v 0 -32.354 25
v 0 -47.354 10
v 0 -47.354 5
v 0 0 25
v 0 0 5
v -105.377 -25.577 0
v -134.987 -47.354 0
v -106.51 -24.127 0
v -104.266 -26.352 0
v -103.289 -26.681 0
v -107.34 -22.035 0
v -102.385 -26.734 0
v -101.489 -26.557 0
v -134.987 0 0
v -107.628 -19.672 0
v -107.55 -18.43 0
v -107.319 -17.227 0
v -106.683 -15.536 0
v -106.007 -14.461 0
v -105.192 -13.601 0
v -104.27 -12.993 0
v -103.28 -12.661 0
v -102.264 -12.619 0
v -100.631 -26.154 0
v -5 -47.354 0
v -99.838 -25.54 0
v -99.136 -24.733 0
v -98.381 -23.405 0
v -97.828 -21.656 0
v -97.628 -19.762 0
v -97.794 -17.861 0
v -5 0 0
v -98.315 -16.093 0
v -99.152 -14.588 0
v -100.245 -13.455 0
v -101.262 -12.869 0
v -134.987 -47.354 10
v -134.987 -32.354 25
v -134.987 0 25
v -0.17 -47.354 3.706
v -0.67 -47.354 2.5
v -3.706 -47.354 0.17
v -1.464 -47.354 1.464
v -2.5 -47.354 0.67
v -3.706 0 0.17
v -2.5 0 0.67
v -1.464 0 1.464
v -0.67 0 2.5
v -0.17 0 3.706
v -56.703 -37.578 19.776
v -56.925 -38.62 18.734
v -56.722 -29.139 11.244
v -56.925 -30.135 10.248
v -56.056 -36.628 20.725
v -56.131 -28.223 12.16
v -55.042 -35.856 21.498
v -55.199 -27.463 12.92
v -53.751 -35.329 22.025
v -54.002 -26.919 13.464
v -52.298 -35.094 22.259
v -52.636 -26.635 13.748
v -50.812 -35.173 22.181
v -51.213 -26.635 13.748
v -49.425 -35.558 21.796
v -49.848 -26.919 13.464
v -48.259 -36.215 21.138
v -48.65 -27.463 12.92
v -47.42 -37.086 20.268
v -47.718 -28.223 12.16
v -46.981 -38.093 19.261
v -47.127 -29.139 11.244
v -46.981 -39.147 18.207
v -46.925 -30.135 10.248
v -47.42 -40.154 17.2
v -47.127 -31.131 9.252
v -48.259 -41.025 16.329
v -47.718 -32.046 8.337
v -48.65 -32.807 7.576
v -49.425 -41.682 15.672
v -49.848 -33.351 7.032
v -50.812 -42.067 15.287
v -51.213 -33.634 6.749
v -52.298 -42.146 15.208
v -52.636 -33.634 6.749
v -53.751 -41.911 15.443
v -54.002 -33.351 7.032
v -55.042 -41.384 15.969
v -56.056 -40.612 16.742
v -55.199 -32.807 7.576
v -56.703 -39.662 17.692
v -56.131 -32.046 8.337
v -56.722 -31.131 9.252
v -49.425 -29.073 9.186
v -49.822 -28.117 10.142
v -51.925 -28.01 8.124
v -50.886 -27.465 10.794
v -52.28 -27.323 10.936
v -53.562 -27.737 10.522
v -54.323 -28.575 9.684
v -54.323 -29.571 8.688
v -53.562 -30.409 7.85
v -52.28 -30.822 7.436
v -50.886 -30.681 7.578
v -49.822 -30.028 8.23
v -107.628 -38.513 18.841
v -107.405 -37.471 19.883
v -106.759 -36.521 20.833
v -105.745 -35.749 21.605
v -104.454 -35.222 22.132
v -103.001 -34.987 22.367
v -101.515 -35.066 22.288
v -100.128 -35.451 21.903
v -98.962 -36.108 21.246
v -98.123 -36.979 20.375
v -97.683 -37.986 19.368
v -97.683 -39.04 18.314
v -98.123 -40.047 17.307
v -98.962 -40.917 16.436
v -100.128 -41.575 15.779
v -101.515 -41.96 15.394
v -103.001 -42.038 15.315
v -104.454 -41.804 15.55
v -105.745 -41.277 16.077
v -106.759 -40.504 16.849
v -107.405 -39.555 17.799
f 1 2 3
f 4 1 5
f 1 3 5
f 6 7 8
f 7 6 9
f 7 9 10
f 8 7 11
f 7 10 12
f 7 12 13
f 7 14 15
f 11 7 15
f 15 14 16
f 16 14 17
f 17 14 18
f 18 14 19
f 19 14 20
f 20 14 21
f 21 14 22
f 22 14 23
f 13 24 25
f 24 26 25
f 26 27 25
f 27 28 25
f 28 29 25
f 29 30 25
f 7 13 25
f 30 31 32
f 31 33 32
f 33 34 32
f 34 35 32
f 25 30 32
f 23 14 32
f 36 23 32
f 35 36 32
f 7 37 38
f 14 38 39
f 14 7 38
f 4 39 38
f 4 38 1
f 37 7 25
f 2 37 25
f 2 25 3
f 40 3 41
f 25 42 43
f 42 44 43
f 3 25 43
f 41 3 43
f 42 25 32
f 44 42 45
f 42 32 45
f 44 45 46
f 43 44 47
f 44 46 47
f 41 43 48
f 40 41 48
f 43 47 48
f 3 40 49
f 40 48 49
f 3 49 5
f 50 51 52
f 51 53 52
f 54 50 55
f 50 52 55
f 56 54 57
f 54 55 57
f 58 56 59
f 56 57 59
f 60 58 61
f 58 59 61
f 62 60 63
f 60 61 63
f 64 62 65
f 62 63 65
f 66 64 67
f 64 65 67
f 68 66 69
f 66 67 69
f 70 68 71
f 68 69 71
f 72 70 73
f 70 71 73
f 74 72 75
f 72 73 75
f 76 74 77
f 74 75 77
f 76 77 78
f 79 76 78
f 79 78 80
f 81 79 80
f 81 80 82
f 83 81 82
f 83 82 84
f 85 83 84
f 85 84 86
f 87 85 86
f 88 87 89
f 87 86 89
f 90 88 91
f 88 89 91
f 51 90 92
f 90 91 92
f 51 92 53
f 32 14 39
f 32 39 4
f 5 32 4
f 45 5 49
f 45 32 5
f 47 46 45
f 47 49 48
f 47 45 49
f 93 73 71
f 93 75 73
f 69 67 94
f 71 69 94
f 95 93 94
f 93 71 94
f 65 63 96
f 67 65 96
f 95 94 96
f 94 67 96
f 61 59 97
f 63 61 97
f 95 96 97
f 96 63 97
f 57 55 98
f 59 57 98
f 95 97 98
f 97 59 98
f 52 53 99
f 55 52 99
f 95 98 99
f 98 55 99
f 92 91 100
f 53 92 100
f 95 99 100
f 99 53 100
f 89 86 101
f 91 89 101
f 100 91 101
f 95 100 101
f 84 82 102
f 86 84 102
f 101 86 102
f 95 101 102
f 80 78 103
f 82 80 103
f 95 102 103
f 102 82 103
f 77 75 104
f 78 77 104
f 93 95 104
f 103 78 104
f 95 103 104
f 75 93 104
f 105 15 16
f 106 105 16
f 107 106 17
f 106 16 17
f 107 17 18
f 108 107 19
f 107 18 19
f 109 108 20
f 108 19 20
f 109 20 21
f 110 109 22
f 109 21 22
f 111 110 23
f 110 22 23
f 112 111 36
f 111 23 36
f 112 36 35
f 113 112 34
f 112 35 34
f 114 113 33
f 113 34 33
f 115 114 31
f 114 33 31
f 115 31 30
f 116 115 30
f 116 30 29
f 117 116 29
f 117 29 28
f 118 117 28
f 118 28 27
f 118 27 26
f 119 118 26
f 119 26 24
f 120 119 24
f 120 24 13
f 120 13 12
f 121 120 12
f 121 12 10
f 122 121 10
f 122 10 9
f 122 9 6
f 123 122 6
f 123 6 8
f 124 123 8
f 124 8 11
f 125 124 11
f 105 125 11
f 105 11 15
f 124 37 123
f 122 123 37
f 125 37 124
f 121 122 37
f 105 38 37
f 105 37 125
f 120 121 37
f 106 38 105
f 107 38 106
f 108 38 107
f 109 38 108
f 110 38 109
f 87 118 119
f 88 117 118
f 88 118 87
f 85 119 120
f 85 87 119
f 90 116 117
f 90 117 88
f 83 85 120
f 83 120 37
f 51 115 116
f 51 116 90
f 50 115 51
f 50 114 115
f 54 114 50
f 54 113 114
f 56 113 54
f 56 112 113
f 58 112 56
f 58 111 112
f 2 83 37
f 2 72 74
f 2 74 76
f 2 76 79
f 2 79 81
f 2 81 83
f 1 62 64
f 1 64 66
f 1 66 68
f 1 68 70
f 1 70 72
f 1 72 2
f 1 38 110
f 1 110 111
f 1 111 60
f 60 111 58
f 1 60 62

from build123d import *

# Parameters (mm, degrees)
F0_W     = 134.9869966507
F0_H     = 47.353733331
F1_DEPTH = 25
F2_SIZE  = 15
F5_D     = 10
F6_D     = 10
F6_DEPTH = 12
F6_TIP   = 3.0043030951
F7_R     = 5


with BuildPart() as f1:
    # F0 (on Top) → F1 (new body)
    with BuildSketch(Plane.XY):
        with Locations((-67.4934983253, -23.6768666655)):
            Rectangle(F0_W, F0_H)
    extrude(amount=F1_DEPTH)

    # F2
    f2_edges = [f1.edges().sort_by_distance(p)[0] for p in [
        (-67.493498, -47.353733, 25),
    ]]
    chamfer(f2_edges, length=F2_SIZE)

    # F5 (through all)
    with Locations(Plane(origin=(0, -28.6768666655, 28.6768666655), x_dir=(1, 0, 0), z_dir=(0, -0.7071067812, 0.7071067812))):
        with Locations((-102.6275157928, -13.9099992812)):
            Hole(F5_D / 2)

    # F6
    with Locations(Plane(origin=(0, -28.6768666655, 28.6768666655), x_dir=(1, 0, 0), z_dir=(0, -0.7071067812, 0.7071067812))):
        with Locations((-51.9247092307, -14.0617964789)):
            Hole(F6_D / 2, depth=F6_DEPTH)
            with Locations((0, 0, -(F6_DEPTH + F6_TIP / 2))):  # 118° drill point
                Cone(0, F6_D / 2, F6_TIP, mode=Mode.SUBTRACT)

    # F7
    f7_edges = [f1.edges().sort_by_distance(p)[0] for p in [
        (0, -23.676867, 0),
    ]]
    fillet(f7_edges, radius=F7_R)


solid = f1.part
